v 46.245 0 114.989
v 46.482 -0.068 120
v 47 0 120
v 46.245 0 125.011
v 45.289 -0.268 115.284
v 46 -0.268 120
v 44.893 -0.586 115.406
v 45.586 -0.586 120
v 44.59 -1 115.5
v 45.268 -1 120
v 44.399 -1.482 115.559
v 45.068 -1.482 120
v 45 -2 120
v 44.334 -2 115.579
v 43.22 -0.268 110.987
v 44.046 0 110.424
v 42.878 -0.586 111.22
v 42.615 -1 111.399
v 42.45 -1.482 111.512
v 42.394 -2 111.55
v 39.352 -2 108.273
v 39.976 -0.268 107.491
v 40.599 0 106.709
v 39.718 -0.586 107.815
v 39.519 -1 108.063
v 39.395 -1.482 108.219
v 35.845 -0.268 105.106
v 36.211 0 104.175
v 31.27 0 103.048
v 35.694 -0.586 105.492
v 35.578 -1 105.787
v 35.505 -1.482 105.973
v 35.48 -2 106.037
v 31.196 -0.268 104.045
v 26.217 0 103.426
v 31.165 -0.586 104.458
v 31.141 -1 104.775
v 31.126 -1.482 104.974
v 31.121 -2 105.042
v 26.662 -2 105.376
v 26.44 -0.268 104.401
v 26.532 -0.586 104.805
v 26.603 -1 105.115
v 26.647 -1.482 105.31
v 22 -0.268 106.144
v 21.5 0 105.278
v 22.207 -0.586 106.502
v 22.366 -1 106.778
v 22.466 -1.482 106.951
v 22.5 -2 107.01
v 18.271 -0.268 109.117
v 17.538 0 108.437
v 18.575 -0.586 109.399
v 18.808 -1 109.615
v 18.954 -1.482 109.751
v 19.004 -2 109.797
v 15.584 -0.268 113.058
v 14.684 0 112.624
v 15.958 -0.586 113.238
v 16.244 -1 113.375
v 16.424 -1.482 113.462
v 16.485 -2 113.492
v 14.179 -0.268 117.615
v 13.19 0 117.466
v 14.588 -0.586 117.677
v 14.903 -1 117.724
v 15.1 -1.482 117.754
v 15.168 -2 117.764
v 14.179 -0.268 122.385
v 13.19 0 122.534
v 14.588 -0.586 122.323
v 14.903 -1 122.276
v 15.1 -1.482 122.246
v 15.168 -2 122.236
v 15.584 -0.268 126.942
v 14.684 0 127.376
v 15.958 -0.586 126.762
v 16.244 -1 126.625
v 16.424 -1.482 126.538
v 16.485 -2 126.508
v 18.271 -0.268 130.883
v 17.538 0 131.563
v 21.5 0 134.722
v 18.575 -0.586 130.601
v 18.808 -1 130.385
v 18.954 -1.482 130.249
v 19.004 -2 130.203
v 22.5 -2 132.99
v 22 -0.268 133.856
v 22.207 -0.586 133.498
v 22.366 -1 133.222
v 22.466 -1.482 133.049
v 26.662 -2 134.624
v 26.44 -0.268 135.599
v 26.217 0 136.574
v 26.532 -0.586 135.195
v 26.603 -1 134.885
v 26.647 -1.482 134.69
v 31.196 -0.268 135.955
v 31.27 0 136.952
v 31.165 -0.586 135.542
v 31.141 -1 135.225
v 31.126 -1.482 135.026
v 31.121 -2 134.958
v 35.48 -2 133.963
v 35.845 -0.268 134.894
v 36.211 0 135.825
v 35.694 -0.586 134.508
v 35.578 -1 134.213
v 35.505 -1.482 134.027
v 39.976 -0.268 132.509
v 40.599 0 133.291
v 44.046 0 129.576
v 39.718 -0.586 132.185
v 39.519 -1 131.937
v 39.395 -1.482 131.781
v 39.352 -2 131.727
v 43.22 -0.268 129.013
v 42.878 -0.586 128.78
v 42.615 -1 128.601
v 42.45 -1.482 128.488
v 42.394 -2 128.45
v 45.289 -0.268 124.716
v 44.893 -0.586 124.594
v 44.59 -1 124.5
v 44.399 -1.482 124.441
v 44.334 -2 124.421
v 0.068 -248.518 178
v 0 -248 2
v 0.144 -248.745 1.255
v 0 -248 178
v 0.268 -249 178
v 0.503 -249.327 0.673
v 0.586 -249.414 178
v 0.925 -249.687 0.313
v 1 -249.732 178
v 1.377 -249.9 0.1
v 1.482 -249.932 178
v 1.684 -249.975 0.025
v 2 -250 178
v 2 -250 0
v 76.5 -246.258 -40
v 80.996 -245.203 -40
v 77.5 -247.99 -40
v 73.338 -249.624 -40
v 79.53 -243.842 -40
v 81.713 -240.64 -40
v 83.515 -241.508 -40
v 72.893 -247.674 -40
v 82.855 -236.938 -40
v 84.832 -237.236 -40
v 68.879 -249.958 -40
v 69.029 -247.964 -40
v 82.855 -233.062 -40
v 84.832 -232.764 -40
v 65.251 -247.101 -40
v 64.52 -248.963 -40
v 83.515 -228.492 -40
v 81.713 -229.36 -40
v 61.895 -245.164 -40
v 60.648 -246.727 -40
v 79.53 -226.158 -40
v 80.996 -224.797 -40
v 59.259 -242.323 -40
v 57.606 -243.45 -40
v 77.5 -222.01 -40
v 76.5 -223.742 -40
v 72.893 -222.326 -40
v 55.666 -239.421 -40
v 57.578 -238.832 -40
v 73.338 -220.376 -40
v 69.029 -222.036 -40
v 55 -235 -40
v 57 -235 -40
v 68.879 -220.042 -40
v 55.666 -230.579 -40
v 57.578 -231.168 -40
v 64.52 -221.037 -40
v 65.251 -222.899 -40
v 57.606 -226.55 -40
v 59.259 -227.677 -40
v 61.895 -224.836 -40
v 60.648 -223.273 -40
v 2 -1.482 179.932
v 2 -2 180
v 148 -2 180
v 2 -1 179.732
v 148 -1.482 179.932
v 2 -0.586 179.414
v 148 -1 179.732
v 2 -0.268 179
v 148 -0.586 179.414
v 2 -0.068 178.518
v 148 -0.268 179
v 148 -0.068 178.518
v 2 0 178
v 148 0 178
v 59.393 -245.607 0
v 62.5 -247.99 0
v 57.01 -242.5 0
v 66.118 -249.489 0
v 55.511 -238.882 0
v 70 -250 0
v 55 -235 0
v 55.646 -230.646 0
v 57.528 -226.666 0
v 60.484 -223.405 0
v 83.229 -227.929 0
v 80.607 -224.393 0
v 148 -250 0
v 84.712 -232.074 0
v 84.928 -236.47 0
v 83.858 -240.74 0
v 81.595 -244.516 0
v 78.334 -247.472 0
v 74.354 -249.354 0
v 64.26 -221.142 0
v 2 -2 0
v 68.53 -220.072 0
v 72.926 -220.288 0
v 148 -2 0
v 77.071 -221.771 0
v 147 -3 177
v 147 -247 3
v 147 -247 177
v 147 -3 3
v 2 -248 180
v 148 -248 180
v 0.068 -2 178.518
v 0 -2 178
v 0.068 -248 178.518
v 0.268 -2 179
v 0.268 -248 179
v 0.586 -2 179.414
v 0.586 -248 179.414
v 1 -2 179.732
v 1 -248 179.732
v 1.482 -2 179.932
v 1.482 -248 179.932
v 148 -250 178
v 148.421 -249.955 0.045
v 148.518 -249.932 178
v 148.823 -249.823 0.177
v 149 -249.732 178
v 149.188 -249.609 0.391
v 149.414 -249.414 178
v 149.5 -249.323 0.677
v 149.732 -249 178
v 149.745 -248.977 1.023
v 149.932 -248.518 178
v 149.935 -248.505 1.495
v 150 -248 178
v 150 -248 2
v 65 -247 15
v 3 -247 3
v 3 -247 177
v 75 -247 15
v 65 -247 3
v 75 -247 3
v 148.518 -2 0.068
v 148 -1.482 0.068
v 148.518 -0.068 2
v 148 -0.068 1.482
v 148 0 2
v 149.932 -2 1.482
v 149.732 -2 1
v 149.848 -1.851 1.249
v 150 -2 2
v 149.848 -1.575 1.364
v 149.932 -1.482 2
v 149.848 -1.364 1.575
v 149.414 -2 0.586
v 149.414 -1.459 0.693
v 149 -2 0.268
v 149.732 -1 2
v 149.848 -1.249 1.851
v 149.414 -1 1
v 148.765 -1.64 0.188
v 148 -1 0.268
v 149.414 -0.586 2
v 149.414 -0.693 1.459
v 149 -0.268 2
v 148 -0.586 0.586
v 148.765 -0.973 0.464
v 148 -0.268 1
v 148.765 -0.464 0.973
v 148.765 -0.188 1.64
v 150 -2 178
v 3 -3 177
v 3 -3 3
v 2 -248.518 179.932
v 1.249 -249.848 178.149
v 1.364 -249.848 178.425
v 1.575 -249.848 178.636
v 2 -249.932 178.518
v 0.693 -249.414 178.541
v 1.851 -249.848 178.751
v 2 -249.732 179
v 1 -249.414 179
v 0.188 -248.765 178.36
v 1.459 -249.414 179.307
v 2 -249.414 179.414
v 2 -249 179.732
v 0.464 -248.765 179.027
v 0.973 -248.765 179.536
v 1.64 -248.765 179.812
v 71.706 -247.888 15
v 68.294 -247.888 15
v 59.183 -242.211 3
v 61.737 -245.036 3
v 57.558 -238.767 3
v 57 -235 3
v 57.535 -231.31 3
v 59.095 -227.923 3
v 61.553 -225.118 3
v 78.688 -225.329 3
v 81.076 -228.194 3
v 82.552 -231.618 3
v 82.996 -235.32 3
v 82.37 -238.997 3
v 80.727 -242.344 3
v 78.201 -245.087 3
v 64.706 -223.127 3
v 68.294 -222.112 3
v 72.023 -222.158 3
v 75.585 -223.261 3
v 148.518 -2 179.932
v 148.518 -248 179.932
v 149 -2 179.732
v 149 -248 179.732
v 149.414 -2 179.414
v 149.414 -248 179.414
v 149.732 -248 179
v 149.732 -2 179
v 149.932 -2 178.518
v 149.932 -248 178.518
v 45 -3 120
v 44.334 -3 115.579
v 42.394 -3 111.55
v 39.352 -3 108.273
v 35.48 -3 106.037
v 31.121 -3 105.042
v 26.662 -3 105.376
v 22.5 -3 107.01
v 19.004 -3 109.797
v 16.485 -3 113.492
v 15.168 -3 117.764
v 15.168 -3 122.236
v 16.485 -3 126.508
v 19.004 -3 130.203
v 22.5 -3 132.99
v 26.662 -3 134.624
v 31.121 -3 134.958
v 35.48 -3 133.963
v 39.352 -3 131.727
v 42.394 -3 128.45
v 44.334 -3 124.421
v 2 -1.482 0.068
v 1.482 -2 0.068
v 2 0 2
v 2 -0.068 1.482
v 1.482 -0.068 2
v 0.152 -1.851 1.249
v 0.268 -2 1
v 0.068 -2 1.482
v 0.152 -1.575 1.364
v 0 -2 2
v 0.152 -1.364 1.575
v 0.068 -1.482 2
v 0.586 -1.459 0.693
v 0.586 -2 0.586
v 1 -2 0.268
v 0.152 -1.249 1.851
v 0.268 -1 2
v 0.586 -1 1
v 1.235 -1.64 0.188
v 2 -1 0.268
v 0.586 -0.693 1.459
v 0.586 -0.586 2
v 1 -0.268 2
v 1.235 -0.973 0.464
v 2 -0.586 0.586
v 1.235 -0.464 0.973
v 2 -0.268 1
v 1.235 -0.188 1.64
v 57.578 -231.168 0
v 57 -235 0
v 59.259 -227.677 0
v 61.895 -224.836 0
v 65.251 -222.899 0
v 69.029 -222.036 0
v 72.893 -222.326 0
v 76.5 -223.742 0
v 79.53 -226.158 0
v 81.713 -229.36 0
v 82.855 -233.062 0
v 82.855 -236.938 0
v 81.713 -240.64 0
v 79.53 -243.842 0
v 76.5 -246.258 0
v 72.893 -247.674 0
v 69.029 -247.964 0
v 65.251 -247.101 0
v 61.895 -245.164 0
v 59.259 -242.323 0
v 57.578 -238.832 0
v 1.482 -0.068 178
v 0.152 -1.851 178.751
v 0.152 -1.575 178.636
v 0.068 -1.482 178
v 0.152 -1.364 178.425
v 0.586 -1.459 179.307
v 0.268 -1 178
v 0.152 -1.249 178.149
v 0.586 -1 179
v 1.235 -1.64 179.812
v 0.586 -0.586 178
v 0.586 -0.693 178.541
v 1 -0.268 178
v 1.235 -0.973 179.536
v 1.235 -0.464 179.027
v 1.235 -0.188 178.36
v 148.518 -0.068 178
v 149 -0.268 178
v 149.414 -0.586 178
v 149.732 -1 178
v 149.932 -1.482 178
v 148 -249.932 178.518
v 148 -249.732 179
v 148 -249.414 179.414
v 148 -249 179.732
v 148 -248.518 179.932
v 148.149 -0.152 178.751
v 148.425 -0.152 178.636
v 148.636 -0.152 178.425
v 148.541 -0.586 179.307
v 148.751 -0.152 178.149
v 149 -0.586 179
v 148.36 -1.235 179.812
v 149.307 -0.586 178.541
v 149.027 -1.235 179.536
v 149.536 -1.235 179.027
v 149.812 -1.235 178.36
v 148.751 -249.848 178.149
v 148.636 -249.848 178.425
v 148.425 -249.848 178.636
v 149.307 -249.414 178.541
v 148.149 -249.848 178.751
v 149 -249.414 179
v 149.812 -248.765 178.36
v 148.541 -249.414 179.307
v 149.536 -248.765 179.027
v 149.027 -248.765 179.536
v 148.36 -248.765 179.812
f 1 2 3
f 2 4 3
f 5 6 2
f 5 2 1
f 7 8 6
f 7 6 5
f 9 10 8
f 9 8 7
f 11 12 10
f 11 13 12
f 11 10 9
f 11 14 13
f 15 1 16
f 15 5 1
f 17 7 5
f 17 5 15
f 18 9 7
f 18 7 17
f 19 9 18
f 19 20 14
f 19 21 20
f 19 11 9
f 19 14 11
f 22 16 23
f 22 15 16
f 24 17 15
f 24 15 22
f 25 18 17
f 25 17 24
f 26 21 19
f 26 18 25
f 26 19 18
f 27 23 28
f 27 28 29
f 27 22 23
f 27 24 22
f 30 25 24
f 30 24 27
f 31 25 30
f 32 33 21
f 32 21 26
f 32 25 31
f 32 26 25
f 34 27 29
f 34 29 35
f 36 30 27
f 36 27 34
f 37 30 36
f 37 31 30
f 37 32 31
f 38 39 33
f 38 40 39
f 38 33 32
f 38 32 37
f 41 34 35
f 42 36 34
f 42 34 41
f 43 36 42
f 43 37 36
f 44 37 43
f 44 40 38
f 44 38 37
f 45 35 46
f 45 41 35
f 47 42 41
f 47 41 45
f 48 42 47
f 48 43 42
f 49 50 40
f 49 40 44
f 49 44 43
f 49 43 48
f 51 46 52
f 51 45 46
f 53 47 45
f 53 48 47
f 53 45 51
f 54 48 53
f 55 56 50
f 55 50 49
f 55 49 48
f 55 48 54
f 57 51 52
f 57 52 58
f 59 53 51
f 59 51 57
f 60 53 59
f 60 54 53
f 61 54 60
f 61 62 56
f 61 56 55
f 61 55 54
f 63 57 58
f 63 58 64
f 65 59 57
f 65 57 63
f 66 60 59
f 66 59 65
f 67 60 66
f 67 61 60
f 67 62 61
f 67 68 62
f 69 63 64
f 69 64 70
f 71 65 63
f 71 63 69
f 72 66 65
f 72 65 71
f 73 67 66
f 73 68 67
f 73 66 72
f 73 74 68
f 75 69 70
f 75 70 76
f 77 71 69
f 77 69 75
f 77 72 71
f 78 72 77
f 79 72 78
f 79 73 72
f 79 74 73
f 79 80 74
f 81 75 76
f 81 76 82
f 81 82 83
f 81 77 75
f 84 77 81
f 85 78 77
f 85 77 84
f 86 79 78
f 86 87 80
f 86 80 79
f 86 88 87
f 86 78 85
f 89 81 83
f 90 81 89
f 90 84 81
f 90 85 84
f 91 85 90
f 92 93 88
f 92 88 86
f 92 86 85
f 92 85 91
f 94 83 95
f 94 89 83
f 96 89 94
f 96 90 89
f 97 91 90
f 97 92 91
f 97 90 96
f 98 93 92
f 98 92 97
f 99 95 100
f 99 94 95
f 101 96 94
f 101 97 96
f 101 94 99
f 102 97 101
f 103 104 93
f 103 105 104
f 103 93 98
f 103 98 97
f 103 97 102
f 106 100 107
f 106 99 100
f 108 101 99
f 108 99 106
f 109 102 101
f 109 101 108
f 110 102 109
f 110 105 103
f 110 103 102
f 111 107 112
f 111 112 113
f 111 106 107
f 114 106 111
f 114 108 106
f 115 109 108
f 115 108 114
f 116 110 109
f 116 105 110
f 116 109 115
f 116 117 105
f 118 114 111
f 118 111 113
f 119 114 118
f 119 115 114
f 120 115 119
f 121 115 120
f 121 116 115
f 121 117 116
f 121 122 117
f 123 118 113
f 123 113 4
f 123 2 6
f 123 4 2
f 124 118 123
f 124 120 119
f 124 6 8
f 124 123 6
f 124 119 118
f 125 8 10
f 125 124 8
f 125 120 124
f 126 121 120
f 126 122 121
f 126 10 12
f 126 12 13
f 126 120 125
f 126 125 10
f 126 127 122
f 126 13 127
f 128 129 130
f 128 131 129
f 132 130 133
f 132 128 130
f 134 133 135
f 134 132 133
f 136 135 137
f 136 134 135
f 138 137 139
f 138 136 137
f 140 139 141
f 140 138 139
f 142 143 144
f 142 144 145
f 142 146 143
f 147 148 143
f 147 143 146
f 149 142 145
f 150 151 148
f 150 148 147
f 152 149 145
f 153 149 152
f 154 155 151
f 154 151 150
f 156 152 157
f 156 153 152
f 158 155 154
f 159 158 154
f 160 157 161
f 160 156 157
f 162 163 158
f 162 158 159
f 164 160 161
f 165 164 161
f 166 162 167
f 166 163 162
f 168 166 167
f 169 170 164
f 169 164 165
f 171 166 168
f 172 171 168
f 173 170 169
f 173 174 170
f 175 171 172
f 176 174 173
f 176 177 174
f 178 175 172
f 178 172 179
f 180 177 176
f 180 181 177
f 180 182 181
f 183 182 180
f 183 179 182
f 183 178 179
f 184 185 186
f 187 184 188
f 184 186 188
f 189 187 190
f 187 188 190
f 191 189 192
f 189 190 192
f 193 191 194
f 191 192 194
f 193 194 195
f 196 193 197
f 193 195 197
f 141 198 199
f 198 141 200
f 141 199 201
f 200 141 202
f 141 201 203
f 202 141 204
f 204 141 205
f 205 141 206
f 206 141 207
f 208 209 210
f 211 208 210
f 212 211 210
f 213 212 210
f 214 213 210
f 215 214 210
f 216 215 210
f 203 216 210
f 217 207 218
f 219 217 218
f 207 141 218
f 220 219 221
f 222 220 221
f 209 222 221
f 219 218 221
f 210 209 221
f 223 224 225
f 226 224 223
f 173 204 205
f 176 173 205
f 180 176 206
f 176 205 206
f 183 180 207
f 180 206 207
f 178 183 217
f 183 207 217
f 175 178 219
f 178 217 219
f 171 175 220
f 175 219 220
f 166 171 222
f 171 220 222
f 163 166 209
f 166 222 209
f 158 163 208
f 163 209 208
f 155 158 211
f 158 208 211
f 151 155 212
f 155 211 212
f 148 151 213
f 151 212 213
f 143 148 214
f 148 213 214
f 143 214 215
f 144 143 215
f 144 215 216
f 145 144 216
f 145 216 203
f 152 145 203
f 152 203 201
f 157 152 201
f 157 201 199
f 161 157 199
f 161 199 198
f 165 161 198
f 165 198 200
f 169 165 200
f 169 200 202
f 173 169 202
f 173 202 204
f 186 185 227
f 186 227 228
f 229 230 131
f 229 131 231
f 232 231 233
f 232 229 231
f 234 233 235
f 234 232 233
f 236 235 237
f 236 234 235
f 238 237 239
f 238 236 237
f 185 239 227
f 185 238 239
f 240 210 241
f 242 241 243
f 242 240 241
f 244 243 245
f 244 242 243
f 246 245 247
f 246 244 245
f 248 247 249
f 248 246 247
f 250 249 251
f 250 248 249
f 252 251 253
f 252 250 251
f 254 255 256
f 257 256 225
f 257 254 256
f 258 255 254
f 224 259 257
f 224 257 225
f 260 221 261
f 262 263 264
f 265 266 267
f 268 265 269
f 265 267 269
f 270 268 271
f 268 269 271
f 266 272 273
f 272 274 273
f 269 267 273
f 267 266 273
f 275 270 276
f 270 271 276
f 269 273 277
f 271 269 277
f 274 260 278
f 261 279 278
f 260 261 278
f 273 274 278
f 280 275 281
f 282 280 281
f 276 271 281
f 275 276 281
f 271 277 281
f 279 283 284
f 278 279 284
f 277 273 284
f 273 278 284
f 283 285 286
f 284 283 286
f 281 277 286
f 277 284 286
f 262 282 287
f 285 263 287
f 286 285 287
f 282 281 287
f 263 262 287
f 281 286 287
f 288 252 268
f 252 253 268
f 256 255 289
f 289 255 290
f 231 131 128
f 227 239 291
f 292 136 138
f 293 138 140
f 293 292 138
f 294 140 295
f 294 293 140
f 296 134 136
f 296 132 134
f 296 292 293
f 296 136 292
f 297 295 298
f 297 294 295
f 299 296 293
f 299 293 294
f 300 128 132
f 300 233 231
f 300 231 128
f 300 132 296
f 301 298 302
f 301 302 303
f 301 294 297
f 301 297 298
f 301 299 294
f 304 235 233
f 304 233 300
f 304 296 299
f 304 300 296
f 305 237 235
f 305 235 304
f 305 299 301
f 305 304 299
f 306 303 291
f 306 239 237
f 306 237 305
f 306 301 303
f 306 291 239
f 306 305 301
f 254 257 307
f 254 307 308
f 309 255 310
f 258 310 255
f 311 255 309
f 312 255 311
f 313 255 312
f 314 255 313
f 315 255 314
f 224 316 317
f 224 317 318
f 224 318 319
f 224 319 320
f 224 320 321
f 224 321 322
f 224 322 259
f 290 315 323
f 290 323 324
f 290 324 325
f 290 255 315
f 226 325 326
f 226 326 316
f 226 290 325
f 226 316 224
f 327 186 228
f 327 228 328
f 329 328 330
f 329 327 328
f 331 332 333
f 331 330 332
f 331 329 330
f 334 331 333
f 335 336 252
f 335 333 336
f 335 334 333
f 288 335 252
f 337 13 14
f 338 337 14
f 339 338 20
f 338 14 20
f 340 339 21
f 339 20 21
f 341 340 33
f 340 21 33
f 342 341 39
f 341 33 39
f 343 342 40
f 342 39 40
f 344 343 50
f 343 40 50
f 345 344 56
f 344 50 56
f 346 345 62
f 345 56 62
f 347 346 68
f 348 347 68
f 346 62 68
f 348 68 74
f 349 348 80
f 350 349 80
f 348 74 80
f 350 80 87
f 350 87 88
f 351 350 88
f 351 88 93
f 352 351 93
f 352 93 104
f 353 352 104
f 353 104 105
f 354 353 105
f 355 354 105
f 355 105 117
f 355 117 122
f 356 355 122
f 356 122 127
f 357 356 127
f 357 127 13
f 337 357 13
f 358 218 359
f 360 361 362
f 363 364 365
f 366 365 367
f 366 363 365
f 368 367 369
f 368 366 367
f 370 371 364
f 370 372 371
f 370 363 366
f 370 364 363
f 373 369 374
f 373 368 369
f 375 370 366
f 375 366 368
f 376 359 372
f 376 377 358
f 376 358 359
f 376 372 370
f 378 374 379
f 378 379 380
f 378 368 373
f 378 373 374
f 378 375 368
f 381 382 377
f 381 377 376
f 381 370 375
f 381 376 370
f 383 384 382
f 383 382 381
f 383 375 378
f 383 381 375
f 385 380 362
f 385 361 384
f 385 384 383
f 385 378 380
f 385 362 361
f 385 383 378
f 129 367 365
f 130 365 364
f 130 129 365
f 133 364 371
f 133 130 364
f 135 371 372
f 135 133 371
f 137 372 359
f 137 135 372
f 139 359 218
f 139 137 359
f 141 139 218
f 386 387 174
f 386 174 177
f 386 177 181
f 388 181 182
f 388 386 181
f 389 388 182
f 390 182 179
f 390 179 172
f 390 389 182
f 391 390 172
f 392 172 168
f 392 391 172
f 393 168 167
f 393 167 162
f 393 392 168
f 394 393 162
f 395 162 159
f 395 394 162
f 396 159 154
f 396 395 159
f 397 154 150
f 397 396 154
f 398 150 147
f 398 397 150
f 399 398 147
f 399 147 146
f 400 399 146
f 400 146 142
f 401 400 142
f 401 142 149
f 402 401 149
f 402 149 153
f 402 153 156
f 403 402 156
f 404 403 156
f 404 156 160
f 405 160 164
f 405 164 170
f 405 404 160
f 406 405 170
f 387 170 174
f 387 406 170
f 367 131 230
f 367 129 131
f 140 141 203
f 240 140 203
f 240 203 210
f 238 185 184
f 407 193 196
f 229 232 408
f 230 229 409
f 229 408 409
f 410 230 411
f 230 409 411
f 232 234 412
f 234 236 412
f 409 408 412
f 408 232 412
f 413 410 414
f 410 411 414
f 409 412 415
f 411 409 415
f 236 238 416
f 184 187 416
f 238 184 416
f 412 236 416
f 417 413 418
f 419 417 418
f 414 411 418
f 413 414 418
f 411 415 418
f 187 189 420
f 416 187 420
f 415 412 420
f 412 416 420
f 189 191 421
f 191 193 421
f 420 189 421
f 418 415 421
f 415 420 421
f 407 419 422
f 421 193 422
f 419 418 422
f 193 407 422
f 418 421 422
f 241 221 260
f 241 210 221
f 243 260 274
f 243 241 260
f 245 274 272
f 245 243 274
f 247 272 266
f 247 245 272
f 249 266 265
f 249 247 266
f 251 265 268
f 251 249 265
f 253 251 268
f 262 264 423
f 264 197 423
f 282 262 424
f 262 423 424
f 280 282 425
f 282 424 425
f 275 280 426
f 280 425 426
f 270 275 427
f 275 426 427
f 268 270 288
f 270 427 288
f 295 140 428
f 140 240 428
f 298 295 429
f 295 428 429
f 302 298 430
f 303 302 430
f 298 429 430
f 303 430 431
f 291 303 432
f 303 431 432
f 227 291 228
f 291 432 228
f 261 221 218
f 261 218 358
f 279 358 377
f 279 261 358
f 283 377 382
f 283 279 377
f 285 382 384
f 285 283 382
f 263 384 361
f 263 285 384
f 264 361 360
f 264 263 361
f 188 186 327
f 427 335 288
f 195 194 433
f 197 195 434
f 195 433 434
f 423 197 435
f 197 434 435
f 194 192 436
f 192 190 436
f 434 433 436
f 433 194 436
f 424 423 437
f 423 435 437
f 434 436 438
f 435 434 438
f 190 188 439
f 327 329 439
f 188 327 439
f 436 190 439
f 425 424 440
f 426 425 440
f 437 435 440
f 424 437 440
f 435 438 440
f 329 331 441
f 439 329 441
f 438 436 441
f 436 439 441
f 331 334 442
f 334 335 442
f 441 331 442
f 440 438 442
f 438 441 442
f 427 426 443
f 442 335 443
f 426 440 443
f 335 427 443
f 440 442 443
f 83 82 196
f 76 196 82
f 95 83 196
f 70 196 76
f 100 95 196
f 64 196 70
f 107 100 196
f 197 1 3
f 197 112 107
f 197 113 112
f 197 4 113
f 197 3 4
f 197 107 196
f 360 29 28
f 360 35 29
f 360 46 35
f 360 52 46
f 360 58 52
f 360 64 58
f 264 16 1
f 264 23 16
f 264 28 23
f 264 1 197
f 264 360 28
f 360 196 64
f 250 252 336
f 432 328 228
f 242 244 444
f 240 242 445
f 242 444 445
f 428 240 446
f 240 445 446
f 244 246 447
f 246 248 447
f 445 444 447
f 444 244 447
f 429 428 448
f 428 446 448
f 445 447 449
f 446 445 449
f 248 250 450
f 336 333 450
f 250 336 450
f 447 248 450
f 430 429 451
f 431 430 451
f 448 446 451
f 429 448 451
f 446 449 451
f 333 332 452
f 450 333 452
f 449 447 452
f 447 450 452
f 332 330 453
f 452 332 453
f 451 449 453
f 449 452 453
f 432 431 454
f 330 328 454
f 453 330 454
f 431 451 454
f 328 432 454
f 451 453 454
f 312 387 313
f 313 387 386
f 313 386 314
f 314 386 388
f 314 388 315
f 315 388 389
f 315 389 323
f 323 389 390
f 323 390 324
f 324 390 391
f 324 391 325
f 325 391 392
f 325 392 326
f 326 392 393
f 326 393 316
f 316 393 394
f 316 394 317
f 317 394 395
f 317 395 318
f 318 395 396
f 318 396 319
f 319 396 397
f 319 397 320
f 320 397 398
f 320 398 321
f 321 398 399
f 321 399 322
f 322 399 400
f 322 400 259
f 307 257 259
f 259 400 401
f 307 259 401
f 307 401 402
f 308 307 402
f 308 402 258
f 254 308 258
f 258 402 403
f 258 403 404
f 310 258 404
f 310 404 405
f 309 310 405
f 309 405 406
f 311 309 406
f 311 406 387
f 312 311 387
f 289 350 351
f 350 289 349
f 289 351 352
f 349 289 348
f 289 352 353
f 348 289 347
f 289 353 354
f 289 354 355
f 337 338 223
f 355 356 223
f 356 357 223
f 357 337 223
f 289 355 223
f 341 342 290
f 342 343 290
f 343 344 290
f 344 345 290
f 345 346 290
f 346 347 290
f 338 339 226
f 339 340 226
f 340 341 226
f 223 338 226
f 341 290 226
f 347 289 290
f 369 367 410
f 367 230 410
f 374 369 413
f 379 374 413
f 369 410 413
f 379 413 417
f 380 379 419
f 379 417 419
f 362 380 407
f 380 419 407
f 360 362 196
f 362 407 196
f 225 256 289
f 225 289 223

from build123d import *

# Parameters (mm, degrees)
SKETCH1_W           = 150
SKETCH1_H           = 250
BOSS_EXTRUDE1_DEPTH = 180
SHELL1_T            = -3
SKETCH2_W           = 150
SKETCH2_H           = 3
BOSS_EXTRUDE2_DEPTH = 180
SKETCH3_R           = 15
CUT_EXTRUDE1_DEPTH  = 10
FILLET1_R           = 2
SKETCH9_R           = 13
CUT_EXTRUDE2_DEPTH  = 15
BOSS_EXTRUDE3_START = 40
SKETCH9_3_R         = 15
SKETCH9_3_R_2       = 13
BOSS_EXTRUDE3_DEPTH = 40


with BuildPart() as part:
    # Sketch1 → Boss-Extrude1 (new body)
    with BuildSketch(Plane.XY):
        with Locations((75, -125)):
            Rectangle(SKETCH1_W, SKETCH1_H)
    extrude(amount=BOSS_EXTRUDE1_DEPTH)

    # Shell1
    shell1_openings = [part.faces().sort_by_distance(p)[0] for p in [
        (75, 0, 90),
    ]]
    offset(amount=SHELL1_T, openings=shell1_openings, kind=Kind.INTERSECTION)

    # Sketch2 → Boss-Extrude2 (add)
    with BuildSketch(Plane.XY):
        with Locations((75, -1.5)):
            Rectangle(SKETCH2_W, SKETCH2_H)
    extrude(amount=BOSS_EXTRUDE2_DEPTH)

    # Sketch3 → Cut-Extrude1 (cut)
    with BuildSketch(Plane(origin=(0, 0, 0), x_dir=(1, 0, 0), z_dir=(0, 1, 0))):
        with Locations((30, -120)):
            Circle(SKETCH3_R)
    extrude(amount=-CUT_EXTRUDE1_DEPTH, mode=Mode.SUBTRACT)

    # Fillet1
    fillet1_edges = [part.edges().sort_by_distance(p)[0] for p in [
        (0, 0, 90),
        (150, 0, 90),
        (0, -250, 90),
        (150, -250, 90),
        (0, -125, 0),
        (150, -125, 0),
        (75, 0, 0),
        (75, 0, 180),
        (150, -125, 180),
        (75, -250, 180),
        (0, -125, 180),
        (15, 0, 120),
    ]]
    fillet(fillet1_edges, radius=FILLET1_R)

    # Sketch9 → Cut-Extrude2 (cut)
    with BuildSketch(Plane(origin=(0, 0, 0), x_dir=(-1, 0, 0), z_dir=(0, 0, -1))):
        with Locations((-70, -235)):
            Circle(SKETCH9_R)
    extrude(amount=-CUT_EXTRUDE2_DEPTH, mode=Mode.SUBTRACT)

    # Sketch9<3> → Boss-Extrude3 (add)
    with BuildSketch(Plane(origin=(0, 0, 0), x_dir=(-1, 0, 0), z_dir=(0, 0, -1)).offset(BOSS_EXTRUDE3_START)):
        with Locations((-70, -235)):
            Circle(SKETCH9_3_R)
        with Locations((-70, -235)):
            Circle(SKETCH9_3_R_2, mode=Mode.SUBTRACT)
    extrude(amount=-BOSS_EXTRUDE3_DEPTH)


solid = part.part
